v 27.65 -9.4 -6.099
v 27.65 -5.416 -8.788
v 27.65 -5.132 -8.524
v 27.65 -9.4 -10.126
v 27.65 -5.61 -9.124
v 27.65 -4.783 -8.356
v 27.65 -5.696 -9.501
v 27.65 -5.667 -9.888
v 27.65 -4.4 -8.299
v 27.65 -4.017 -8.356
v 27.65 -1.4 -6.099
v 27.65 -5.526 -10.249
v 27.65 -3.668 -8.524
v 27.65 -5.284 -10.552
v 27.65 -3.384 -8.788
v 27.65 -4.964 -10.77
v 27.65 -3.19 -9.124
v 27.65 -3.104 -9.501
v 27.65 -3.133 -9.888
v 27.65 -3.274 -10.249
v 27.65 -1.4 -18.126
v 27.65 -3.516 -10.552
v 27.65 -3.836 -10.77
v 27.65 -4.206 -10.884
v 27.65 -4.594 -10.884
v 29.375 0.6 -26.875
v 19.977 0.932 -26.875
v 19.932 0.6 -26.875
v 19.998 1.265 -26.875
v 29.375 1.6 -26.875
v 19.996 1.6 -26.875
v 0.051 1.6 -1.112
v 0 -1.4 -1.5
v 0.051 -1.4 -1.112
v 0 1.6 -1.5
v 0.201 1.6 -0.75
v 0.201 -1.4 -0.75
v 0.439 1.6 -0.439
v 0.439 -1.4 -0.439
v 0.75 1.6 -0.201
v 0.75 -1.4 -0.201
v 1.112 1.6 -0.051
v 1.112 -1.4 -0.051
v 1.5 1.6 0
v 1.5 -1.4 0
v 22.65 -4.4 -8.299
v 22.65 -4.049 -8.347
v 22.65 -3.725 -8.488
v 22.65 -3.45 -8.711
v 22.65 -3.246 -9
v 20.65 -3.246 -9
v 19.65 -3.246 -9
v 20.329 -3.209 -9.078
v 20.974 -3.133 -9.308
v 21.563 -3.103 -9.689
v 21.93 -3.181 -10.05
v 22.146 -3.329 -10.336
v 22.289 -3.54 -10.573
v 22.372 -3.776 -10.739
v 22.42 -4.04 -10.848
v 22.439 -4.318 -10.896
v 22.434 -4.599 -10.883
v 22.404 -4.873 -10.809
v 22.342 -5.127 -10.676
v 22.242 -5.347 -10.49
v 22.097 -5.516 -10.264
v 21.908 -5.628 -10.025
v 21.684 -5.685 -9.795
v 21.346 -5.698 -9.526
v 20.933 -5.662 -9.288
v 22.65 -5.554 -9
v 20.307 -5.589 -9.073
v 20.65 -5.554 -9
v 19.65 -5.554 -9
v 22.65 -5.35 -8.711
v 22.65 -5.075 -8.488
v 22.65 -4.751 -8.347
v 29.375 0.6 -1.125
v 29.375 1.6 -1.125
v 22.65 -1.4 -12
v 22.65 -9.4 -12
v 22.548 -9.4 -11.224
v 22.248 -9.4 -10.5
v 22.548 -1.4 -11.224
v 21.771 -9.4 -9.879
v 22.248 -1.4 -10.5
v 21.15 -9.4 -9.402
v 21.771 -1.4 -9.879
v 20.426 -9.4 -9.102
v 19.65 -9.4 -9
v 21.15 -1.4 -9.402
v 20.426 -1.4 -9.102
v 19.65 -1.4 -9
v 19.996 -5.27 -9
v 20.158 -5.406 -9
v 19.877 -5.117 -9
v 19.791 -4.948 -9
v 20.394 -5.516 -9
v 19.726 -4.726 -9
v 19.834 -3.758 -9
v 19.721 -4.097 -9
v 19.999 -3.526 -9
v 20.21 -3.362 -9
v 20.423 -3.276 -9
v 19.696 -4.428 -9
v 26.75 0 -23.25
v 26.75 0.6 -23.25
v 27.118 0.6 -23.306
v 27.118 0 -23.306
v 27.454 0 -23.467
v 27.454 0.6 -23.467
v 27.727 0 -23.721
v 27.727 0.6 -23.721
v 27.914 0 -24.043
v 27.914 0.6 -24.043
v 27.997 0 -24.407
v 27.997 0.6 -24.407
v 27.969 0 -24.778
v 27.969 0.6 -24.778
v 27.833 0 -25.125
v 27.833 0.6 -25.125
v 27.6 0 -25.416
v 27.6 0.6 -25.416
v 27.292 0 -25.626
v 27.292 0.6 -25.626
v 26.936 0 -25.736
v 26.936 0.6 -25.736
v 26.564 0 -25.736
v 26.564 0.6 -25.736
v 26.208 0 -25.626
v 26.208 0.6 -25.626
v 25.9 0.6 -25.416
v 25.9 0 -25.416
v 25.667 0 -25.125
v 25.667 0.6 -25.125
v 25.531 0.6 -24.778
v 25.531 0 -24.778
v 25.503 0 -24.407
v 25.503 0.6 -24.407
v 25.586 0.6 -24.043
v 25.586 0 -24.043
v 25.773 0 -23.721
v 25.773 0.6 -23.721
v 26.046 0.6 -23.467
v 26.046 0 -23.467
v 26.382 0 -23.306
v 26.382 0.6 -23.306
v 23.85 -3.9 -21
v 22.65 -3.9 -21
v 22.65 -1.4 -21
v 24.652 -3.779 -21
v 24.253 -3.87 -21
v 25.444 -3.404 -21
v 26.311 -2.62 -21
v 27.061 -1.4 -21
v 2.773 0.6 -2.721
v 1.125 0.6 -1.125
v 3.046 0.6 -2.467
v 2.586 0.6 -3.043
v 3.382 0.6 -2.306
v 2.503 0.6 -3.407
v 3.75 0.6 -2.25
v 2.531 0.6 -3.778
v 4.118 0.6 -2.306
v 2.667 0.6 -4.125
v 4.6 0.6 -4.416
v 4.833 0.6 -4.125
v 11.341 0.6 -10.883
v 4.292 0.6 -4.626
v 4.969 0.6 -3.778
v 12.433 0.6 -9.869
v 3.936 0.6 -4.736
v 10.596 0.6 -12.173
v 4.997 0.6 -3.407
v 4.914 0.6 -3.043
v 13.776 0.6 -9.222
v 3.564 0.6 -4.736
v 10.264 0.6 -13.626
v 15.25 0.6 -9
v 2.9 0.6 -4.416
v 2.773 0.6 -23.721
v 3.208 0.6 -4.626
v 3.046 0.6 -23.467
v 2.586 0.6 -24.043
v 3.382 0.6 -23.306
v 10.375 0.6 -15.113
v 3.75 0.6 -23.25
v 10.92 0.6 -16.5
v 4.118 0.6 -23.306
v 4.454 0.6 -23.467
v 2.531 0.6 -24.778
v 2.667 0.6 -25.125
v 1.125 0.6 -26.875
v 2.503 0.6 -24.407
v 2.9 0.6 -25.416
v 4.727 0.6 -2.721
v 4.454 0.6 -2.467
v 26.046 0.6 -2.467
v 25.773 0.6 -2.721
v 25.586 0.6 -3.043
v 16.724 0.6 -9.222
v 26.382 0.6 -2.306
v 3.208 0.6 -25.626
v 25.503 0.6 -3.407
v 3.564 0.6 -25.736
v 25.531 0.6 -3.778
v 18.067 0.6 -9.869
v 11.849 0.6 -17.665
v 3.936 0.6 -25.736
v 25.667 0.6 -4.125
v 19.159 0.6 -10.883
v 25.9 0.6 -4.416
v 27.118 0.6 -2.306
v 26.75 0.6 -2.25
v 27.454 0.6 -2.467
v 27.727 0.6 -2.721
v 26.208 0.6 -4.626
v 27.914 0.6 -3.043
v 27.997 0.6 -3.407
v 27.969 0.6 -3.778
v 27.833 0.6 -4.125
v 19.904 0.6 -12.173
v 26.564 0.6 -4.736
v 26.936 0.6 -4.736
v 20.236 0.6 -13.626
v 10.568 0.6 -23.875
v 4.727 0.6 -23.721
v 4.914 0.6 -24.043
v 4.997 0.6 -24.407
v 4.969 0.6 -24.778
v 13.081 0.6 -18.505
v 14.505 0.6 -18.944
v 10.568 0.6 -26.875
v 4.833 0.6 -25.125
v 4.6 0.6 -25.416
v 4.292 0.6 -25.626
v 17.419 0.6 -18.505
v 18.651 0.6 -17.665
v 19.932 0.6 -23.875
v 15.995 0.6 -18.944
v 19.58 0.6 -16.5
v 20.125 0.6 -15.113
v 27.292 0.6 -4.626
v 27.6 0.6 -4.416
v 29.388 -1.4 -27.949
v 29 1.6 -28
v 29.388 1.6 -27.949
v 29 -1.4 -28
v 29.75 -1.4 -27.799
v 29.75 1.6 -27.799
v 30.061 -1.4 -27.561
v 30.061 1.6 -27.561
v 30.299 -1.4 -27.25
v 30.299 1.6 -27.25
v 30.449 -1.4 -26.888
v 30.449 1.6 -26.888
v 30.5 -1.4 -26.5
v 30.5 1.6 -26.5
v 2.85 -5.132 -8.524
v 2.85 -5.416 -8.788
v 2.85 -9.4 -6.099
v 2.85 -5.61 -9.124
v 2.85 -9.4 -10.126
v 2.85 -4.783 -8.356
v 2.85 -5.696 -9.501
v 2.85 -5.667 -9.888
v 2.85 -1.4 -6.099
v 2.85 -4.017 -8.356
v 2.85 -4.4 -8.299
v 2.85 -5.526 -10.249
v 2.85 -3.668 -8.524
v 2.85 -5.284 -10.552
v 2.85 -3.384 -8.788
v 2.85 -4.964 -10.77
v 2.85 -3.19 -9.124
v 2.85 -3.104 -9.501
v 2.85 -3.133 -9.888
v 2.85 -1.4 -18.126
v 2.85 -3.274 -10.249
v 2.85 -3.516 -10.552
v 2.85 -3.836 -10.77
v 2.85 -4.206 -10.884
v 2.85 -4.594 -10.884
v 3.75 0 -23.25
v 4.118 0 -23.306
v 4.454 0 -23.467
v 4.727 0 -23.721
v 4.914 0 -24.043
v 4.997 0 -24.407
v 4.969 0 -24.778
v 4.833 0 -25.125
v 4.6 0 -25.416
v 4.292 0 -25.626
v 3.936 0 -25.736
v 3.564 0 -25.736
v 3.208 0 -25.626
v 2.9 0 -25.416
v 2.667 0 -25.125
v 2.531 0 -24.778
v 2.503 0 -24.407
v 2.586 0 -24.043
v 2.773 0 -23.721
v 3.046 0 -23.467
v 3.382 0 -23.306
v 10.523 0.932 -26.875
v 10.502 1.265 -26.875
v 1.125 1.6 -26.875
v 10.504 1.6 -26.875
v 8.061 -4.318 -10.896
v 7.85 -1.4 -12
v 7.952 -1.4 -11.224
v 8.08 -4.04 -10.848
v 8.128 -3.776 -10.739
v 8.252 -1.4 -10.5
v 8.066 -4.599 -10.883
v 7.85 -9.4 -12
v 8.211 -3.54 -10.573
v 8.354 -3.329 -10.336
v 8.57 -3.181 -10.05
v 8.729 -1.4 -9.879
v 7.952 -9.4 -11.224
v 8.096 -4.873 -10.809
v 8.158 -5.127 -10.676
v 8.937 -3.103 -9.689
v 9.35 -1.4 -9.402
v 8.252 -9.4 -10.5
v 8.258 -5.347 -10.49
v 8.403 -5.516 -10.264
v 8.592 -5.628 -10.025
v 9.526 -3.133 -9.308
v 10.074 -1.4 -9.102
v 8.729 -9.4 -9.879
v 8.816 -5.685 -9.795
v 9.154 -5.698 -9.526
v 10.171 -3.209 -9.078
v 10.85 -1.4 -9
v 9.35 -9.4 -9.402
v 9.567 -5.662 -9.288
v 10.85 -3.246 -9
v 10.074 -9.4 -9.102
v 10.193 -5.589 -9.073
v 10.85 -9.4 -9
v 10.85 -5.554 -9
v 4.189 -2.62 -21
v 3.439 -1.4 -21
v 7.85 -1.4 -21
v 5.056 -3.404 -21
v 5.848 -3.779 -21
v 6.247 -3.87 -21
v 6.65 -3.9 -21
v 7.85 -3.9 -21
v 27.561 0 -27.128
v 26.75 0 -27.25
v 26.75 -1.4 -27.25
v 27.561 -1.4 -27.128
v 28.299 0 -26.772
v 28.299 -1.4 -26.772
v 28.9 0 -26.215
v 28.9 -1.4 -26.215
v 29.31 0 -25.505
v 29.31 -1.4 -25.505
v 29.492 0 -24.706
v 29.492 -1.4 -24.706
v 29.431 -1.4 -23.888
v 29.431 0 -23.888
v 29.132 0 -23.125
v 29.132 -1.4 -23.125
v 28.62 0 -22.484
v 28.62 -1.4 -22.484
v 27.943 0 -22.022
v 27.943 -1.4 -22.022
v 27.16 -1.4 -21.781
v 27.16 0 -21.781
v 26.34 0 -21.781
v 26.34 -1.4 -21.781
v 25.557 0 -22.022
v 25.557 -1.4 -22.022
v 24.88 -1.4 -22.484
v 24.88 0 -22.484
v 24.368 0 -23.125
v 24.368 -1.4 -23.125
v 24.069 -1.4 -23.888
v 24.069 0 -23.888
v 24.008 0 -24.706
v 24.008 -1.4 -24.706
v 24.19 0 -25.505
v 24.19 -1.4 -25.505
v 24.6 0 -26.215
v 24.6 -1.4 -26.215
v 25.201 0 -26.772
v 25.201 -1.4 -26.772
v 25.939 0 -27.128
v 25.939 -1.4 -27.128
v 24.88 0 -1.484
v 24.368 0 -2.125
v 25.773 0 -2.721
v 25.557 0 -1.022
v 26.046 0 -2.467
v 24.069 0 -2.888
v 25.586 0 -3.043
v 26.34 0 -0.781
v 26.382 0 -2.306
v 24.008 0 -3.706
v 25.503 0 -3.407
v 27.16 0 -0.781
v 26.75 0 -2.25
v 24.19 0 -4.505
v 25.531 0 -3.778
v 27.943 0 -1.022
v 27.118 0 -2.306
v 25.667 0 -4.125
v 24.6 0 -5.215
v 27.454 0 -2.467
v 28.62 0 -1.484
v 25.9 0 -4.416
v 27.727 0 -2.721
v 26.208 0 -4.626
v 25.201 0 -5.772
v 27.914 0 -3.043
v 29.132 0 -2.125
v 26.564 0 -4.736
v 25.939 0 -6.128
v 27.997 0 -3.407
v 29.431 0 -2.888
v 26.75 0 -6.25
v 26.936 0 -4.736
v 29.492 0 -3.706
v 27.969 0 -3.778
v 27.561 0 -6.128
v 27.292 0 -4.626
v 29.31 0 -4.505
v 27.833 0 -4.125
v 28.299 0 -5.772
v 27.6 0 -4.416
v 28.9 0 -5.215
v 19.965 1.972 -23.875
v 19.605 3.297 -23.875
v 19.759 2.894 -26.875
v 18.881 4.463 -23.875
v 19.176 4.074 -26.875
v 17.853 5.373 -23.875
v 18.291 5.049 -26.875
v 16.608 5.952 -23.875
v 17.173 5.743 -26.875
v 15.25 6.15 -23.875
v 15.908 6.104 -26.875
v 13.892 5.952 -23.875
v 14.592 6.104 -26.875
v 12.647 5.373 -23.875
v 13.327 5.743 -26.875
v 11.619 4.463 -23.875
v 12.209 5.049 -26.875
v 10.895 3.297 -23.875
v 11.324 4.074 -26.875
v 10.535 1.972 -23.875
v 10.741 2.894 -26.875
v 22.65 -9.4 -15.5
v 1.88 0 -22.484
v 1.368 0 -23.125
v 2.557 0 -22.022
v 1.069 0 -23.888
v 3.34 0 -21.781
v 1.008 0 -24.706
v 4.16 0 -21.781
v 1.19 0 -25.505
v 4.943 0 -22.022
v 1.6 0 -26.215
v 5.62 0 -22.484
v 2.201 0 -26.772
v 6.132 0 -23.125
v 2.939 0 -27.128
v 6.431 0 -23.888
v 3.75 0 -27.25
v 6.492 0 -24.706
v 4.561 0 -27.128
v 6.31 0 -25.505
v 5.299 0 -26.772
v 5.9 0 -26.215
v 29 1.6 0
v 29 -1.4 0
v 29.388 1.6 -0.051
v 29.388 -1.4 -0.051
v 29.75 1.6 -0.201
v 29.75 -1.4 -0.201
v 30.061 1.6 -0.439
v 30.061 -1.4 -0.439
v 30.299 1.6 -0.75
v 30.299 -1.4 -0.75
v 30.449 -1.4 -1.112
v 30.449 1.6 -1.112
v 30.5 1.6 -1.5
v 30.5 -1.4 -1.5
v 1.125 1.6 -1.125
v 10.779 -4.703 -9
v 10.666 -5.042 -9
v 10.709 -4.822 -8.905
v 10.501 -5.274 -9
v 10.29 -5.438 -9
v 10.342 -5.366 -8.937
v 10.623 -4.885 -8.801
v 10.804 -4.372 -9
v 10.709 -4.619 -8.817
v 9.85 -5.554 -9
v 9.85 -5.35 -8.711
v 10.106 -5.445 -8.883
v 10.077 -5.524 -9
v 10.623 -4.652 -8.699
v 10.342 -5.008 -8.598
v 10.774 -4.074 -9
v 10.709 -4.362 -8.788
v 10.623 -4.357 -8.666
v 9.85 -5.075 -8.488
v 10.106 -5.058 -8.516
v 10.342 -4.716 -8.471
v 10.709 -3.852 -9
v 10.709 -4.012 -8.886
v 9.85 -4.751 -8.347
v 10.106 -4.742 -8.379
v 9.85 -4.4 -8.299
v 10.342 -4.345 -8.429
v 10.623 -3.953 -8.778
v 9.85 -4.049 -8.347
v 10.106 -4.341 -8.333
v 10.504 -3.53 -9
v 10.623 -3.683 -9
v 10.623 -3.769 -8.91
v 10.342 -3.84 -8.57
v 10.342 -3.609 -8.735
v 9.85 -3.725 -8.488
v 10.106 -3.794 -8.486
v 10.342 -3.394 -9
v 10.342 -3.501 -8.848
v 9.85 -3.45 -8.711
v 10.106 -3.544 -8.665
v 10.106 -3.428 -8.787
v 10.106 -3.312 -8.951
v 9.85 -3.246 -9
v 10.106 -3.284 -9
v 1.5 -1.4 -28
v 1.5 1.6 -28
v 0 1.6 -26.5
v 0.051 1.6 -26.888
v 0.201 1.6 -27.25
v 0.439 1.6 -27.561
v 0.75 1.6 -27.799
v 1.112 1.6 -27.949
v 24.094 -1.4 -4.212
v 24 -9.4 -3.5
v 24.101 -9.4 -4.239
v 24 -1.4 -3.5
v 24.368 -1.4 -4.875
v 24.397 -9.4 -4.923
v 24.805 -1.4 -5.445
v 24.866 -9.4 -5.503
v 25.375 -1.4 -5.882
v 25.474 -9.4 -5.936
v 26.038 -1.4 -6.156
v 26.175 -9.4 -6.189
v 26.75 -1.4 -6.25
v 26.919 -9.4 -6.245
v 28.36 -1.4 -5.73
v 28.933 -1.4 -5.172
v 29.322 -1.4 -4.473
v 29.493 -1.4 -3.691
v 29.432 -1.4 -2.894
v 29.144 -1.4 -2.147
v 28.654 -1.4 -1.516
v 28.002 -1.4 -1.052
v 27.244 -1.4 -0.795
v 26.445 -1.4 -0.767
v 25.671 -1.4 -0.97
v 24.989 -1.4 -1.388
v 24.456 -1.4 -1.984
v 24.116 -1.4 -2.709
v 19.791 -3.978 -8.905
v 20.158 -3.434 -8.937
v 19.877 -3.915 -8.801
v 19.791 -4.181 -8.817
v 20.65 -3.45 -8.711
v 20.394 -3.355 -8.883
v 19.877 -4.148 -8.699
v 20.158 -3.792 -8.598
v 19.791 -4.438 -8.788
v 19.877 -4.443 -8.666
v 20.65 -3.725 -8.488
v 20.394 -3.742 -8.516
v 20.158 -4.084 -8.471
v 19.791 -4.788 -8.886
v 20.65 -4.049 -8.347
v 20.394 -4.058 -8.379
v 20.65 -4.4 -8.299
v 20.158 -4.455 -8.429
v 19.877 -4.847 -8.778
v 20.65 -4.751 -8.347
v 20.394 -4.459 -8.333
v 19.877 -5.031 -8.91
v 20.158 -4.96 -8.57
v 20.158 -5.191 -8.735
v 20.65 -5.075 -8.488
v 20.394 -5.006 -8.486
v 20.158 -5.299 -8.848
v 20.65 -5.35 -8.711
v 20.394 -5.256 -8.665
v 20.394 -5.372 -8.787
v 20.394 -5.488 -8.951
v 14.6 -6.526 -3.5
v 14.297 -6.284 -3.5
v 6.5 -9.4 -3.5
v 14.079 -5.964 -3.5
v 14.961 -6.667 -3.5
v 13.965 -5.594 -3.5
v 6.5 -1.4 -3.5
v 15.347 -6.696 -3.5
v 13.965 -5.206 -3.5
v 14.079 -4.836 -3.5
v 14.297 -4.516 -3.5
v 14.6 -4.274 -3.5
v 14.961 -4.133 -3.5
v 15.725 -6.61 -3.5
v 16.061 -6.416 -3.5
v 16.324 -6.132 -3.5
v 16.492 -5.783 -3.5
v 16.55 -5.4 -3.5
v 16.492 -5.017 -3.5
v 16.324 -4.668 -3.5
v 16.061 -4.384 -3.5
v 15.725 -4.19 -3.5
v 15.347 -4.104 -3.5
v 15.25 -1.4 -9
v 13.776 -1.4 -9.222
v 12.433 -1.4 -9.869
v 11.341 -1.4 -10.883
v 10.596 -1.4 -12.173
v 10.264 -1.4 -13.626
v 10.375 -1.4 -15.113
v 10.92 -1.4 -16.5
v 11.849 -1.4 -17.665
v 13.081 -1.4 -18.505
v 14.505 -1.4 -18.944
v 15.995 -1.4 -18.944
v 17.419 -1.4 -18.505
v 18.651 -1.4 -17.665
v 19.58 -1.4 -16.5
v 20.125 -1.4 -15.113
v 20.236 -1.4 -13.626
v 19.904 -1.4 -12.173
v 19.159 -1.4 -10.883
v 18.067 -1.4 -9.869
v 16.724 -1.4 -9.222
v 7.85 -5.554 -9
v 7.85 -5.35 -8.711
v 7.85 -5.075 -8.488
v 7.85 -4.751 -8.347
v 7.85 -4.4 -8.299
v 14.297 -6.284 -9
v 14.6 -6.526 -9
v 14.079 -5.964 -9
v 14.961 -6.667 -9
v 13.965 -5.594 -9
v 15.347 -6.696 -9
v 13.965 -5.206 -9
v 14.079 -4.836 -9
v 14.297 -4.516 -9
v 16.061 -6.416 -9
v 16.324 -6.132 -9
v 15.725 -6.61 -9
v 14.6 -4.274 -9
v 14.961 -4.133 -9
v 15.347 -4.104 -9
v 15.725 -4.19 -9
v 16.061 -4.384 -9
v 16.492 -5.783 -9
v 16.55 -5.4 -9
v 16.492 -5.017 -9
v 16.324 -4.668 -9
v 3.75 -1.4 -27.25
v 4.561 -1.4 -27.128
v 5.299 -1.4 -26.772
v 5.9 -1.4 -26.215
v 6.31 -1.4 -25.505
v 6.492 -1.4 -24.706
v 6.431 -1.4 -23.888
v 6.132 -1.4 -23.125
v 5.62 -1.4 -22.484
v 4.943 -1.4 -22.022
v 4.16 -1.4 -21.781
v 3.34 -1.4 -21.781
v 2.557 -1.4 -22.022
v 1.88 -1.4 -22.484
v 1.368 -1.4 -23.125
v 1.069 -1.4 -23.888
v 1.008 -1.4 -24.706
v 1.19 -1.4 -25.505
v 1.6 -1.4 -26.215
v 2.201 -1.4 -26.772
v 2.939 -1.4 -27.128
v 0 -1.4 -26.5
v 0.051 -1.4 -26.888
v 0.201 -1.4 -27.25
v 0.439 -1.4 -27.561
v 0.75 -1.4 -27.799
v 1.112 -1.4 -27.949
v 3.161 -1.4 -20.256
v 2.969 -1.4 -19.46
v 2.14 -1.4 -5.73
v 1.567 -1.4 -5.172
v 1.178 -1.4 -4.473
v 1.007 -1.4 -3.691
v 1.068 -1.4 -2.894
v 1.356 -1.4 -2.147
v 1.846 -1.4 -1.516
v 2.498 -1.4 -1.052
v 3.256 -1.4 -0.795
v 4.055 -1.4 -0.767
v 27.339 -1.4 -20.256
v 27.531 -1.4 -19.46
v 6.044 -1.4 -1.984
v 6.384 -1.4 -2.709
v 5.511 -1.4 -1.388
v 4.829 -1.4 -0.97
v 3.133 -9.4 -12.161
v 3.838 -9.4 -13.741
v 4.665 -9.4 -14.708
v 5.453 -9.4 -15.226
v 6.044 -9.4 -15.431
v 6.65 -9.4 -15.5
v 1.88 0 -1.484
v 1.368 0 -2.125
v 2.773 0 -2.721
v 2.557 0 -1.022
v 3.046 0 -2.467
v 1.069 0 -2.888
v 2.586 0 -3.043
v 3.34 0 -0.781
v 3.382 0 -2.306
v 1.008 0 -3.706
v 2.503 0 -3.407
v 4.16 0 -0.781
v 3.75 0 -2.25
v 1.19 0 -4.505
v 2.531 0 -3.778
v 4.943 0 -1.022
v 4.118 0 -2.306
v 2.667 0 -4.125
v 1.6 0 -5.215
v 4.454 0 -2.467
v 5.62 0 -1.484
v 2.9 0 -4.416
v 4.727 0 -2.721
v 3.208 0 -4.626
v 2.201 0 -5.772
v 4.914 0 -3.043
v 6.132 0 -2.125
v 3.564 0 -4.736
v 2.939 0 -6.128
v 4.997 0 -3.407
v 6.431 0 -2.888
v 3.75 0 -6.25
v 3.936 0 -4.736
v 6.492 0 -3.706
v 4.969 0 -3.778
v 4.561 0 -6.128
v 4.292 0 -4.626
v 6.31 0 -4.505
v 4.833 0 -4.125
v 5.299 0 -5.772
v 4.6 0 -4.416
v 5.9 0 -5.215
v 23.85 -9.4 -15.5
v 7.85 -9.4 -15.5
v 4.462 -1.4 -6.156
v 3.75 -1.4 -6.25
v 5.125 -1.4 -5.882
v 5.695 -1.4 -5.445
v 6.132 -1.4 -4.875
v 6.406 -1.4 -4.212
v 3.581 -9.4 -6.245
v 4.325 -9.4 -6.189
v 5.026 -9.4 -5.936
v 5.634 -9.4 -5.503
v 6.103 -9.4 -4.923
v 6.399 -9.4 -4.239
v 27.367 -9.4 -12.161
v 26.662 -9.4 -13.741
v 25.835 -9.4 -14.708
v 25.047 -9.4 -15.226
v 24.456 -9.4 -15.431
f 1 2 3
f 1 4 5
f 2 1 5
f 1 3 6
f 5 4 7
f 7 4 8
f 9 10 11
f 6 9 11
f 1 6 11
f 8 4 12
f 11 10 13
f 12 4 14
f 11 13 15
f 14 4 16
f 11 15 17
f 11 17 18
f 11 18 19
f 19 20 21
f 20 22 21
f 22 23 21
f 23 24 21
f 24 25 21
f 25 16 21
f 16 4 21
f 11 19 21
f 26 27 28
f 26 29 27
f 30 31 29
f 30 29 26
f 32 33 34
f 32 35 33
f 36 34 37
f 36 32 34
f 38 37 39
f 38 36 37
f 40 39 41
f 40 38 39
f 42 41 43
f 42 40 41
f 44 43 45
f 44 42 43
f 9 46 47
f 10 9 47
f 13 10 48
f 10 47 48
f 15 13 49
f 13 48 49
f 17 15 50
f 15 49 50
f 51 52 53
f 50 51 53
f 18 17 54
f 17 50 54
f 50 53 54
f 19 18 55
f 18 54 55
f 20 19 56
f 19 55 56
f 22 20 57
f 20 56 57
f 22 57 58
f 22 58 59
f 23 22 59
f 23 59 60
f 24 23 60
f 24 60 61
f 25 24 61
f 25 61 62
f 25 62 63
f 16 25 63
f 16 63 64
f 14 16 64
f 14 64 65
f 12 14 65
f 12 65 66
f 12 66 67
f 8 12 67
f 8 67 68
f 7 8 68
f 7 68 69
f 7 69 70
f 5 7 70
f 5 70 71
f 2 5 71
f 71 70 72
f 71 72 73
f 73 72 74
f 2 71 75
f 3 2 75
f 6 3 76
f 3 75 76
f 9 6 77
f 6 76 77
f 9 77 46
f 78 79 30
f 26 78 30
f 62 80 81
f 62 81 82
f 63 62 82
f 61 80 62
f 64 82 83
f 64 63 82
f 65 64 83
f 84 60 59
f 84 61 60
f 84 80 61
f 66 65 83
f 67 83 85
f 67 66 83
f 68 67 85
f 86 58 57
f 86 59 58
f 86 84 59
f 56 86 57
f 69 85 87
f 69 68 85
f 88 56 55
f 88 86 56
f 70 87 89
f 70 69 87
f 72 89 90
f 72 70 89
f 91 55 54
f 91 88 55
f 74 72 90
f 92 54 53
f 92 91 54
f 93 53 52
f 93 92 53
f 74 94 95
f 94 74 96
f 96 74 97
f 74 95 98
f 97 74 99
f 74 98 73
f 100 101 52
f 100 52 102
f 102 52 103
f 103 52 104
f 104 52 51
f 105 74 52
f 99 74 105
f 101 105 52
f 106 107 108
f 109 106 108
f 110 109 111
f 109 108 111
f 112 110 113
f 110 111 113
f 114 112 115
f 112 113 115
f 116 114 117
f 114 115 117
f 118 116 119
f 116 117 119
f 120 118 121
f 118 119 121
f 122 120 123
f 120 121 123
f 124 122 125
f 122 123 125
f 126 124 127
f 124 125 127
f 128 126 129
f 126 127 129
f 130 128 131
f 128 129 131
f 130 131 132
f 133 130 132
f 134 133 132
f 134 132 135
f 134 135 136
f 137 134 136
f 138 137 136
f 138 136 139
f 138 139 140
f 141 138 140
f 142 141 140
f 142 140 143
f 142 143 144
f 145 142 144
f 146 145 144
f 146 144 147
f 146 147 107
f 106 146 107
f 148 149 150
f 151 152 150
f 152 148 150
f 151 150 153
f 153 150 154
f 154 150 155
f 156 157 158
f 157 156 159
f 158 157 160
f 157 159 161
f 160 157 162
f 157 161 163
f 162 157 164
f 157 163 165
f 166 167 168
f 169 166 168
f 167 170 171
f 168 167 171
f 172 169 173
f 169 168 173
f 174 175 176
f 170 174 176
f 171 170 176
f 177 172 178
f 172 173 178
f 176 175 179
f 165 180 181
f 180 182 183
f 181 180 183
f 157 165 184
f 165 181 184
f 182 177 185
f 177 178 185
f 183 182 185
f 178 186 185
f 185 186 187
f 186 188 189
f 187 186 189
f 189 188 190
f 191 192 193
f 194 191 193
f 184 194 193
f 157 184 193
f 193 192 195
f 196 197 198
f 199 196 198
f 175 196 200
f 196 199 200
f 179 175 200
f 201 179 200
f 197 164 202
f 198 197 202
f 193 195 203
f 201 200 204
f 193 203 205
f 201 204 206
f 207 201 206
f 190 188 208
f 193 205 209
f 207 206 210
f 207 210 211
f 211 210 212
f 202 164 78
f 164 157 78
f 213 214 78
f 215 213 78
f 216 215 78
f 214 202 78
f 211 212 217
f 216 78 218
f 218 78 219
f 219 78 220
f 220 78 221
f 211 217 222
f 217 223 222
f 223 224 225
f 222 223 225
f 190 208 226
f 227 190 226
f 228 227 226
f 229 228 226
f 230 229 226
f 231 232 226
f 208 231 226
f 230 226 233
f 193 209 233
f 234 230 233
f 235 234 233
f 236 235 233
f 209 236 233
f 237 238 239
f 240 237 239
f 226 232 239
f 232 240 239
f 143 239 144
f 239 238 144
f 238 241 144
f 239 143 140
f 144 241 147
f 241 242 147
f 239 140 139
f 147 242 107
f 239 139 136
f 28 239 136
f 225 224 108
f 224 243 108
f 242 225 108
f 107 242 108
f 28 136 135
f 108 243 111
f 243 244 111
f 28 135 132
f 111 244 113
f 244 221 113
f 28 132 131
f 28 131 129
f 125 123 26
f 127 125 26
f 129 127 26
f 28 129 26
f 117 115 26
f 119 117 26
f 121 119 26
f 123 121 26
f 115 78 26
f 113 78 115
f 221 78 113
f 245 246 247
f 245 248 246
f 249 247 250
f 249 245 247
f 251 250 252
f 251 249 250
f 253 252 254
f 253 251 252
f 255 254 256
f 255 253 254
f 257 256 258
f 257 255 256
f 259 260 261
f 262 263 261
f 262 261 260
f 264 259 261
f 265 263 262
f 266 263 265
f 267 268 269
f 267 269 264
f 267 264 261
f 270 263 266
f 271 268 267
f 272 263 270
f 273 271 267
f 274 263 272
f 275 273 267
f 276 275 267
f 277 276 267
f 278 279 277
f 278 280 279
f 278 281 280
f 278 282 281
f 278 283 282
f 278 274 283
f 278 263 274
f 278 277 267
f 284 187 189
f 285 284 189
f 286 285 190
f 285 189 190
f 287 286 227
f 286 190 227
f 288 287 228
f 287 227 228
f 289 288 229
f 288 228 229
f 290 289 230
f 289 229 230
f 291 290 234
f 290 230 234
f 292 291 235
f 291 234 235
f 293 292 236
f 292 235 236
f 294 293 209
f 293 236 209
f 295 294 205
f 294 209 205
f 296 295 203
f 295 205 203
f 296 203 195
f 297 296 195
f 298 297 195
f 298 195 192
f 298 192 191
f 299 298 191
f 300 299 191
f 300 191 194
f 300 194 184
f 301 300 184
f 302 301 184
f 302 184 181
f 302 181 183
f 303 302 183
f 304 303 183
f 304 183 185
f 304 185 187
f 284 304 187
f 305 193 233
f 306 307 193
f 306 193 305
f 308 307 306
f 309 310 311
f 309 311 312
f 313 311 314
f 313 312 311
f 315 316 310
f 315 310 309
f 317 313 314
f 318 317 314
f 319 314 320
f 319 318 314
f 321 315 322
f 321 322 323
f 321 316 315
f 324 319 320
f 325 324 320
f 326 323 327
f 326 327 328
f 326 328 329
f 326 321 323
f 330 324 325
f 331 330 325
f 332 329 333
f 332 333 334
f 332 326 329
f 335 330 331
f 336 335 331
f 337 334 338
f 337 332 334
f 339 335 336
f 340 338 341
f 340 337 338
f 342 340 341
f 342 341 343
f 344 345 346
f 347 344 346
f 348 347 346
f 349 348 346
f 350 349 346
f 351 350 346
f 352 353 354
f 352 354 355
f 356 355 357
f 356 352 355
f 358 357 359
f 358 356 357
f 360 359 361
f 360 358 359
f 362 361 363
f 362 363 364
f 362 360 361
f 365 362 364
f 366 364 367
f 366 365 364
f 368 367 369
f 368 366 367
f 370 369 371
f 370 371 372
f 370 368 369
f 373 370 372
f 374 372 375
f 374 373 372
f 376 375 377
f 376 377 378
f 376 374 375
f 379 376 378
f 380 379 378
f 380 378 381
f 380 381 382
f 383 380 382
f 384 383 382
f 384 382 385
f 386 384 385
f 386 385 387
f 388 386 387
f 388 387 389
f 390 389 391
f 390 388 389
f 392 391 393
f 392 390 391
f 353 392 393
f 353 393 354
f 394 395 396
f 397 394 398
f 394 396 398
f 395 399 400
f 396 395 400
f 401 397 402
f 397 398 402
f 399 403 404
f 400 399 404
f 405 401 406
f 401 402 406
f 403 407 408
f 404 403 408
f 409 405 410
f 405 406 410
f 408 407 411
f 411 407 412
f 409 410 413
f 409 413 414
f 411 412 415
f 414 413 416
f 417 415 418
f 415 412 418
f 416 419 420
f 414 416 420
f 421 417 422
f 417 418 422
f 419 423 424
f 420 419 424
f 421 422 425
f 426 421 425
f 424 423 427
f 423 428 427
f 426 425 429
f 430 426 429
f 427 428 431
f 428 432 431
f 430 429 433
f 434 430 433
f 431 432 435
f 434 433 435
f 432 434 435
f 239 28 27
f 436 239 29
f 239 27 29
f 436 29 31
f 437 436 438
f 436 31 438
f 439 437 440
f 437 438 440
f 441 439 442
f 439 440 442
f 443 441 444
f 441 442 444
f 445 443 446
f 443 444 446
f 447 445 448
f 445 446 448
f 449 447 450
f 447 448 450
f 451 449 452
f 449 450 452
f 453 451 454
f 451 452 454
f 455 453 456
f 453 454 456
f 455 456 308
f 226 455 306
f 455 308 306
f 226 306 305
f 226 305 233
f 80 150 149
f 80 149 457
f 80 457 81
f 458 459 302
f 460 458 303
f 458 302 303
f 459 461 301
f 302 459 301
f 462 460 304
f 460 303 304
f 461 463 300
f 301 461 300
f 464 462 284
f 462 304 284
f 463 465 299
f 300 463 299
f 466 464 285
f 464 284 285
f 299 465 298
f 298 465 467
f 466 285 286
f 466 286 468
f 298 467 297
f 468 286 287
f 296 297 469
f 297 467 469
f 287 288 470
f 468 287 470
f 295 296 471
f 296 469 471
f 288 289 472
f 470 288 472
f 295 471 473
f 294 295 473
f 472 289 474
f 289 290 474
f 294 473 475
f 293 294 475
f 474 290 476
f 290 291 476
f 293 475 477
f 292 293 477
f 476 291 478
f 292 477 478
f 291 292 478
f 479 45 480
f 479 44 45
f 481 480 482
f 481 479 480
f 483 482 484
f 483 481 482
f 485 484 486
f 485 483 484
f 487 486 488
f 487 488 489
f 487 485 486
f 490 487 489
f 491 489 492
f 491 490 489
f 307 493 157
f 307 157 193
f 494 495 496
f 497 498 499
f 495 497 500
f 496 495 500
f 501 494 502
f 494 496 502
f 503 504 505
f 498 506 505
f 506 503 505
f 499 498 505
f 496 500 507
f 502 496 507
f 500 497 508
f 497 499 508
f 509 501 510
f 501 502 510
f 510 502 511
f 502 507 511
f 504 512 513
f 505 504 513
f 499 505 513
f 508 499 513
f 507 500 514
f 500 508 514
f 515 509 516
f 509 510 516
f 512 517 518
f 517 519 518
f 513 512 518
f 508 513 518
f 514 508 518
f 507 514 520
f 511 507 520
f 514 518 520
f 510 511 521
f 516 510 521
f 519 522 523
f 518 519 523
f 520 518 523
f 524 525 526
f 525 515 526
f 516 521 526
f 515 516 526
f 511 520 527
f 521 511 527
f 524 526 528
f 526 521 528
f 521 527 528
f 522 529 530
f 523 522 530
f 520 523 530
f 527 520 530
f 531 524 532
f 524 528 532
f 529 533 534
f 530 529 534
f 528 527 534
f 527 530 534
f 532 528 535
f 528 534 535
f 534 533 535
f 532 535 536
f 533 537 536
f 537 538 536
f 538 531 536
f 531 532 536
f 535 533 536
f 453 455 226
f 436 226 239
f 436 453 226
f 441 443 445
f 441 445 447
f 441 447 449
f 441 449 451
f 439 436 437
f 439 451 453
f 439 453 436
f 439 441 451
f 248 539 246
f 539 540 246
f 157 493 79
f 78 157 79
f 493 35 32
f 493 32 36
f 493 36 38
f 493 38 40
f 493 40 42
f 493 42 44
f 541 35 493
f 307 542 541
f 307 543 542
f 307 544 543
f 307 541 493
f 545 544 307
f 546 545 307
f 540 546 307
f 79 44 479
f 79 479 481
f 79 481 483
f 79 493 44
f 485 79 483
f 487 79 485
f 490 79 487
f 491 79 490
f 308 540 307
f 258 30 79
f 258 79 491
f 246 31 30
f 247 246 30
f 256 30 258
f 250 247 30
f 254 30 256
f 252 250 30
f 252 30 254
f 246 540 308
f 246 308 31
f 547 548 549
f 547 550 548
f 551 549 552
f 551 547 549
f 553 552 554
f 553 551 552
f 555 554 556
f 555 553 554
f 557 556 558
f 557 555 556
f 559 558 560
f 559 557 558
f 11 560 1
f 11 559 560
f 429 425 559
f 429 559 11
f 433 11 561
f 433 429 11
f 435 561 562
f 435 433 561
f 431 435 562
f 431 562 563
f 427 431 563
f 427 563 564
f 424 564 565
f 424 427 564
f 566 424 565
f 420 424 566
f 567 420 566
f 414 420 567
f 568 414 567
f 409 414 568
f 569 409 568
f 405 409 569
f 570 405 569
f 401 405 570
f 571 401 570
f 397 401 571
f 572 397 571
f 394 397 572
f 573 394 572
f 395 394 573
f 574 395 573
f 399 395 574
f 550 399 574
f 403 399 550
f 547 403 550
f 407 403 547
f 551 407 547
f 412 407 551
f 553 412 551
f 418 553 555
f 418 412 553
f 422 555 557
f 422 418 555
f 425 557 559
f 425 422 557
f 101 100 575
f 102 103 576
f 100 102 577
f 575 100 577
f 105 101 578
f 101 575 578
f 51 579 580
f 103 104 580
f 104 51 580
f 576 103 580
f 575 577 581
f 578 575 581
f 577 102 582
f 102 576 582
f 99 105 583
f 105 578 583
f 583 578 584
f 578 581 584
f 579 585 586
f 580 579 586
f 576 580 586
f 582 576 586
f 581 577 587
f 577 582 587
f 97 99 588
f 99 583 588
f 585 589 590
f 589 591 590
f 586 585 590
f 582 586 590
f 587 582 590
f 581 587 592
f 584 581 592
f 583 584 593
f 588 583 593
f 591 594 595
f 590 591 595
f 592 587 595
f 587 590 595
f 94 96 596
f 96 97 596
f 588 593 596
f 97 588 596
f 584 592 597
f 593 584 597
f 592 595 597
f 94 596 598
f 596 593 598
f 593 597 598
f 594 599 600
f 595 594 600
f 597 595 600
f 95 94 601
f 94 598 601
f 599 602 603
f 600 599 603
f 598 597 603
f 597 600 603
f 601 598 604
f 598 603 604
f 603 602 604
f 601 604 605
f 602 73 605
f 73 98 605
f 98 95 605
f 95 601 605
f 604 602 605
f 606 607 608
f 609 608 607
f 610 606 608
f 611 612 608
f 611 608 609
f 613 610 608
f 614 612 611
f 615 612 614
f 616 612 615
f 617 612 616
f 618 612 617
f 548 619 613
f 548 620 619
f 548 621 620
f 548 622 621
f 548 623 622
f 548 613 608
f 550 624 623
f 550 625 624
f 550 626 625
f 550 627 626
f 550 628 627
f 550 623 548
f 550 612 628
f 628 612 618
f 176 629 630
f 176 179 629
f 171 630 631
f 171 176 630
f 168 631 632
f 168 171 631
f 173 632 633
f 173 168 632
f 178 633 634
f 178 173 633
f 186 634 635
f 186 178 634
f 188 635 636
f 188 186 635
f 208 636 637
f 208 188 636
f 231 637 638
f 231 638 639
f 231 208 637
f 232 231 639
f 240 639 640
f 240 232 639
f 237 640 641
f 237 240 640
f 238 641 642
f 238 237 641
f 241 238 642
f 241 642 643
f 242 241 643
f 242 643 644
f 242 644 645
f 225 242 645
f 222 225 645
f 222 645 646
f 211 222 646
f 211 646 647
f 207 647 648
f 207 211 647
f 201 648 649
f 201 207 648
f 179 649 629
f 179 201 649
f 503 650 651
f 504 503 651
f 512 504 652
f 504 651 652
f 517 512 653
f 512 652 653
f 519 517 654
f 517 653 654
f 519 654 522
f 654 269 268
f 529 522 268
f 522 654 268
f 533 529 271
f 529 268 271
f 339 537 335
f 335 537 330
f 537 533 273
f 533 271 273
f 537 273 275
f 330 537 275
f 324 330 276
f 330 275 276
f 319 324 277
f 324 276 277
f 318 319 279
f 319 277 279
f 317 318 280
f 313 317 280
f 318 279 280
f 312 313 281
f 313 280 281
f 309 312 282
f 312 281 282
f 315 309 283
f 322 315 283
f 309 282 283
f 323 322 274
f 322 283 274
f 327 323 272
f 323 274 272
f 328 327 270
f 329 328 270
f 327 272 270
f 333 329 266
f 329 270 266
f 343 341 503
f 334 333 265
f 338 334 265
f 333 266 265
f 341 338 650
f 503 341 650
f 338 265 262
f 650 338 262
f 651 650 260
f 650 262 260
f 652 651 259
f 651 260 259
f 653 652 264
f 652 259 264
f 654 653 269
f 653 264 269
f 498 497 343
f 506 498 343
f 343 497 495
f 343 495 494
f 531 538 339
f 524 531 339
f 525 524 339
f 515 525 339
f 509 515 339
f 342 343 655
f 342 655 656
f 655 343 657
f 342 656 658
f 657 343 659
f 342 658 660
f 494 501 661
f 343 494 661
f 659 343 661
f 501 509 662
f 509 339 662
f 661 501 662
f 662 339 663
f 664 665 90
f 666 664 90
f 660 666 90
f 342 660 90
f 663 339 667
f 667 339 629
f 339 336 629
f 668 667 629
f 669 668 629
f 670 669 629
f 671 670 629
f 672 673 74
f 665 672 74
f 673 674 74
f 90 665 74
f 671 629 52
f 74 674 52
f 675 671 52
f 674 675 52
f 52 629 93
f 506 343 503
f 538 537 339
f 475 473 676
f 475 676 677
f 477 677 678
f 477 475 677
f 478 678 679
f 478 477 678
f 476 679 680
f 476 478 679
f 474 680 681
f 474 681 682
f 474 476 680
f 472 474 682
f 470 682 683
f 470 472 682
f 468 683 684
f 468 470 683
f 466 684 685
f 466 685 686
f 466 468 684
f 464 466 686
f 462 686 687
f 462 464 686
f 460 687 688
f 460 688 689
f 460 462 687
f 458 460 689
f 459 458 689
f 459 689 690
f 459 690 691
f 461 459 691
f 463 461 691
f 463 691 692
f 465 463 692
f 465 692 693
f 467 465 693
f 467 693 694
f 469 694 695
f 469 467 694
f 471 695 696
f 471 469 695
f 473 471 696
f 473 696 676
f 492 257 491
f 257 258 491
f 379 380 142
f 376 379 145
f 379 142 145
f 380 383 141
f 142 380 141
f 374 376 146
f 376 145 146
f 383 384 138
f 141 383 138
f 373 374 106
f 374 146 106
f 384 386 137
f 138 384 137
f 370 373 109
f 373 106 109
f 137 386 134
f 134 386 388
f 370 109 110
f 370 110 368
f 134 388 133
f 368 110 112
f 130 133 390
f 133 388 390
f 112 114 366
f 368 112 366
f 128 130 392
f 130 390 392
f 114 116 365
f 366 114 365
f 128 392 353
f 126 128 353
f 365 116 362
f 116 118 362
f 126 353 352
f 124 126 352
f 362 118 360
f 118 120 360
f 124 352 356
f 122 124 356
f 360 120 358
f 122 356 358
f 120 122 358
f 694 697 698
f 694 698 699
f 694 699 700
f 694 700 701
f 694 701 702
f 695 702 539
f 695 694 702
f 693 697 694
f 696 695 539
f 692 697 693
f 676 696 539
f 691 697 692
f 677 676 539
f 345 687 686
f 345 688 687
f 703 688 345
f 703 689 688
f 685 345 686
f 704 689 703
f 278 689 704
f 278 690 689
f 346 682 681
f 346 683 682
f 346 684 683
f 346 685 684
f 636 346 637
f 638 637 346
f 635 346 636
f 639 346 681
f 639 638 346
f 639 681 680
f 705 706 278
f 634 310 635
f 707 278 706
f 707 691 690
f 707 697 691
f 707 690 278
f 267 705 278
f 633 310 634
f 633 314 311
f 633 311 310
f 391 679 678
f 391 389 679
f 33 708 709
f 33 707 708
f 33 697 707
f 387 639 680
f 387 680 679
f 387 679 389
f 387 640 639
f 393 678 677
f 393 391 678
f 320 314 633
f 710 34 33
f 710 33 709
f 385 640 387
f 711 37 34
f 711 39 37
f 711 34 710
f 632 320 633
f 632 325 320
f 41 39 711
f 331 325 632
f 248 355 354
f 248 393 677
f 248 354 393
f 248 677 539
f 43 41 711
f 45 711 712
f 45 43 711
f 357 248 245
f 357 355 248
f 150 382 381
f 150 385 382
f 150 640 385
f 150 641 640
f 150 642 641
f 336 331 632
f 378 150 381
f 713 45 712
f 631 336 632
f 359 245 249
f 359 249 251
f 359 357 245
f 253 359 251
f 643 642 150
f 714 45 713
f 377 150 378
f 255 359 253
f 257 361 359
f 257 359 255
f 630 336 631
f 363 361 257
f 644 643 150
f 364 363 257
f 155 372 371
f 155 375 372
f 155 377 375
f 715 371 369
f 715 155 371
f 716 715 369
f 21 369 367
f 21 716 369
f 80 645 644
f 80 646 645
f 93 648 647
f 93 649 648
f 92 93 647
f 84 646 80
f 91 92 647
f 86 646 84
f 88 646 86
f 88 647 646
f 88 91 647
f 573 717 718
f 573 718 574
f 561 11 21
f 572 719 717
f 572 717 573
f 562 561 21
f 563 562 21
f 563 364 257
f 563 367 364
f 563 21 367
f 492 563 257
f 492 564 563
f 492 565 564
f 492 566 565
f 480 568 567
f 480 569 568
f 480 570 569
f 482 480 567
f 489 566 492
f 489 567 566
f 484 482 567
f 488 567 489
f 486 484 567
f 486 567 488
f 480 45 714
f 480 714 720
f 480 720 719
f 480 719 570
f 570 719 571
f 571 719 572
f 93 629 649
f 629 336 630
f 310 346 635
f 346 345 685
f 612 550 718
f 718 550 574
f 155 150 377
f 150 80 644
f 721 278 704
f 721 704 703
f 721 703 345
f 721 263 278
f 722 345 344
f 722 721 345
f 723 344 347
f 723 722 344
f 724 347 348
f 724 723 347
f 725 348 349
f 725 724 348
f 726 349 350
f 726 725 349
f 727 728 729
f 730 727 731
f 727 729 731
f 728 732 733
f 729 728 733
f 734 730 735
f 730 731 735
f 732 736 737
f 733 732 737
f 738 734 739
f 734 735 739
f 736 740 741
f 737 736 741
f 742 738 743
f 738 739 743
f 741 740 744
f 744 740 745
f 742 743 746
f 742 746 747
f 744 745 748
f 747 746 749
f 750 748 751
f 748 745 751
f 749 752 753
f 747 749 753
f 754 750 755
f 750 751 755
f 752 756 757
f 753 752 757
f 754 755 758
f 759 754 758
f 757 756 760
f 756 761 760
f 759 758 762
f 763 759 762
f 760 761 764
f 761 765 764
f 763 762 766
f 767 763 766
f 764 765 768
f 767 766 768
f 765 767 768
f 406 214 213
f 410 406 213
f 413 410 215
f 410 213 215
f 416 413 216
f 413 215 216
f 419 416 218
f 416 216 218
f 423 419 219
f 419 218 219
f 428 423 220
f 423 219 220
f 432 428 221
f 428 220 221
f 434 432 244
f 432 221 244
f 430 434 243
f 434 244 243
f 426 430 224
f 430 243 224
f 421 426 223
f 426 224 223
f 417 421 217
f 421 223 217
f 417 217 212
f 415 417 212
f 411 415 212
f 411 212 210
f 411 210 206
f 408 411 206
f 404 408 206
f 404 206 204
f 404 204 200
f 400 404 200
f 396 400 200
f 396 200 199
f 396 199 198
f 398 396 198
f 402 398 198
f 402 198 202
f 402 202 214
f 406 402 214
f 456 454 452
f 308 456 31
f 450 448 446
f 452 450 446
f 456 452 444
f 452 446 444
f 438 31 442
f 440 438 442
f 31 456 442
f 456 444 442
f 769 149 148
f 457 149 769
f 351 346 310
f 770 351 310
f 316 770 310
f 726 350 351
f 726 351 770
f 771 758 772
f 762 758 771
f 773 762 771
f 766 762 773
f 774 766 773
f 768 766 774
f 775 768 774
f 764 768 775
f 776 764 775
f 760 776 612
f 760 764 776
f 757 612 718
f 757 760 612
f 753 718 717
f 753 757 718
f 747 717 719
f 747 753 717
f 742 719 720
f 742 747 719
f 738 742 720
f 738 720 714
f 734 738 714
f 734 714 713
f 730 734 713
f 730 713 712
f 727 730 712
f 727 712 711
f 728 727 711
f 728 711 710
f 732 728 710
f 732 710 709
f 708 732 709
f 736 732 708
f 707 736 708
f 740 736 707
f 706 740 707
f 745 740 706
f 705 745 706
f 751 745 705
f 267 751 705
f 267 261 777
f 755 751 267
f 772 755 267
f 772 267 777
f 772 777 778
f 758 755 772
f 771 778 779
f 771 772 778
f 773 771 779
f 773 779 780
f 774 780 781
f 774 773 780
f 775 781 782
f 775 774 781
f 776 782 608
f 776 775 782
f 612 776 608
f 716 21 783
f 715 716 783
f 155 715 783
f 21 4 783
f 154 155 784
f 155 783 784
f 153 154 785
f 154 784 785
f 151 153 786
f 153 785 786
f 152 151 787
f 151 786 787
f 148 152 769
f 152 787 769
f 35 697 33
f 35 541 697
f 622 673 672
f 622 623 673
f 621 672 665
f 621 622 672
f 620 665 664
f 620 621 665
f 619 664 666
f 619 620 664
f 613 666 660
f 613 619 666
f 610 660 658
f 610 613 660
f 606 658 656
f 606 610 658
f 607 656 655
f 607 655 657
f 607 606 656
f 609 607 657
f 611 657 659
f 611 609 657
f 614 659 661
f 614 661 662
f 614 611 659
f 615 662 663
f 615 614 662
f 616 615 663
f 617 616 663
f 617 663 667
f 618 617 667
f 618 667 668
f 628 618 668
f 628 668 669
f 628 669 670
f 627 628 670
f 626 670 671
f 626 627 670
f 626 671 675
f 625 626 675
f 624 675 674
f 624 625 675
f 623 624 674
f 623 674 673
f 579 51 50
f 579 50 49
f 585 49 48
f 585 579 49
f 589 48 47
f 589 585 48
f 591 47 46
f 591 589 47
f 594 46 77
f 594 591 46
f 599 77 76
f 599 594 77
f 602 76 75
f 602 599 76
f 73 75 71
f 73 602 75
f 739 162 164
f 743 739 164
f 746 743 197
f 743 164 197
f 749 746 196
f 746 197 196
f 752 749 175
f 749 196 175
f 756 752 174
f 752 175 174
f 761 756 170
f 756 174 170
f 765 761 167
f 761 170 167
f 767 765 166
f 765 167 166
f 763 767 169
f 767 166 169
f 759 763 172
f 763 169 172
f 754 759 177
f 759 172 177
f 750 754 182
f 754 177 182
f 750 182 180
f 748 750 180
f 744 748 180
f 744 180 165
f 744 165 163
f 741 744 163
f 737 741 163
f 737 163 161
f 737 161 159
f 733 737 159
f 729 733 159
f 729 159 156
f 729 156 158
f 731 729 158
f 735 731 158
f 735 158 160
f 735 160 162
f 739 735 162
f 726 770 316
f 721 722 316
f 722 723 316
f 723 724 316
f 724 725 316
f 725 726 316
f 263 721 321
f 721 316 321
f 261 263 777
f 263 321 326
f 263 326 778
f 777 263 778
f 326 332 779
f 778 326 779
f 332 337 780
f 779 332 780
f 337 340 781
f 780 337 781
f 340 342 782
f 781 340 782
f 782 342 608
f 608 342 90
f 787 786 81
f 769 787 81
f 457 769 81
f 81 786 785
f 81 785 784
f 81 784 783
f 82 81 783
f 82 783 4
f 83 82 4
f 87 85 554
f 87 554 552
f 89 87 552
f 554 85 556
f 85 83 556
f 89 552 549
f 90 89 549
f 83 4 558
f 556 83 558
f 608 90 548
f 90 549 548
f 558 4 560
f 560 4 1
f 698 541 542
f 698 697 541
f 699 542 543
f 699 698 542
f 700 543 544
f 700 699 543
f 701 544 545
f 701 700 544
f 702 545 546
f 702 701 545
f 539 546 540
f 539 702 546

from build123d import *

# Parameters (mm, degrees)
SKETCH_1_W           = 30.5
SKETCH_1_H           = 28
EXTRUDE_1_DEPTH      = 1.6
SKETCH_2_W           = 28.25
SKETCH_2_H           = 25.75
CUT_EXTRUDE_1_DEPTH  = 1
EXTRUDE_2_DEPTH      = 3
CUT_EXTRUDE_2_REACH  = 43.774
SKETCH_5_R           = 1.25
CUT_EXTRUDE_3_REACH  = 43.774
SKETCH_6_R           = 5
SKETCH_7_W           = 30.5
SKETCH_7_H           = 28
SKETCH_7_R           = 2.75
SKETCH_7_R_2         = 5
EXTRUDE_3_DEPTH      = 1.4
SKETCH_8_W           = 5
SKETCH_8_H           = 14
EXTRUDE_4_DEPTH      = 10
CUT_EXTRUDE_4_DEPTH  = 41.969287277
SKETCH_10_W          = 24.8
SKETCH_10_H          = 10
EXTRUDE_5_DEPTH      = 3.5
SKETCH_11_R          = 2.75
CUT_EXTRUDE_5_DEPTH  = 43.944266206
SKETCH_12_R          = 1.3
CUT_EXTRUDE_6_DEPTH  = 41.969287277
CUT_EXTRUDE_7_REACH  = 42.749
SKETCH_13_R          = 1.3
CUT_EXTRUDE_8_REACH  = 42.969
SKETCH_14_W          = 12
SKETCH_14_H          = 2
SKETCH_15_W          = 14.8
SKETCH_15_H          = 8
SKETCH_15_R          = 1.3
EXTRUDE_6_DEPTH      = 2
FILLET_1_R           = 3.8
FILLET_2_R           = 1.5
FILLET_3_R           = 3
CUT_EXTRUDE_START    = -3
CUT_EXTRUDE_9_DEPTH  = 3
CUT_EXTRUDE_10_DEPTH = 3
FILLET_4_R           = 1


with BuildPart() as part:
    # 草图1 → 凸台-拉伸1 (new body)
    with BuildSketch(Plane(origin=(0, 0, 0), x_dir=(1, 0, 0), z_dir=(0, 1, 0))):
        with Locations((15.25, 14)):
            Rectangle(SKETCH_1_W, SKETCH_1_H)
    extrude(amount=EXTRUDE_1_DEPTH)

    # 草图2 → 切除-拉伸1 (cut)
    with BuildSketch(Plane(origin=(0, 1.6, 0), x_dir=(1, 0, 0), z_dir=(0, 1, 0))):
        with Locations((15.25, 14)):
            Rectangle(SKETCH_2_W, SKETCH_2_H)
    extrude(amount=-CUT_EXTRUDE_1_DEPTH, mode=Mode.SUBTRACT)

    # 草图3 → 凸台-拉伸2 (add)
    with BuildSketch(Plane(origin=(57.75, 0, -26.875), x_dir=(1, 0, 0), z_dir=(0, 0, 1))):
        with BuildLine():
            Line((-47.182146943, 0.6), (-37.817853057, 0.6))
            ThreePointArc((-37.817853057, 0.6), (-42.5, 6.15), (-47.182146943, 0.6))
        make_face()
    extrude(amount=EXTRUDE_2_DEPTH)

    # 草图5 → 切除-拉伸2 (cut, up to next)
    with BuildSketch(Plane(origin=(0, 0.6, 0), x_dir=(1, 0, 0), z_dir=(0, 1, 0)), mode=Mode.PRIVATE) as cut_extrude_2_sk1:
        with Locations(Location((3.75, 24.5, 0), (0, 0, 270))):
            Circle(SKETCH_5_R)
    cut_extrude_2_tool1 = extrude(cut_extrude_2_sk1.sketch, amount=-CUT_EXTRUDE_2_REACH, mode=Mode.PRIVATE) & part.part
    # 草图5 → 切除-拉伸2 (cut, up to next)
    with BuildSketch(Plane(origin=(0, 0.6, 0), x_dir=(1, 0, 0), z_dir=(0, 1, 0)), mode=Mode.PRIVATE) as cut_extrude_2_sk2:
        with Locations(Location((26.75, 24.5, 0), (0, 0, 270))):
            Circle(SKETCH_5_R)
    cut_extrude_2_tool2 = extrude(cut_extrude_2_sk2.sketch, amount=-CUT_EXTRUDE_2_REACH, mode=Mode.PRIVATE) & part.part
    # 草图5 → 切除-拉伸2 (cut, up to next)
    with BuildSketch(Plane(origin=(0, 0.6, 0), x_dir=(1, 0, 0), z_dir=(0, 1, 0)), mode=Mode.PRIVATE) as cut_extrude_2_sk3:
        with Locations(Location((3.75, 3.5, 0), (0, 0, 270))):
            Circle(SKETCH_5_R)
    cut_extrude_2_tool3 = extrude(cut_extrude_2_sk3.sketch, amount=-CUT_EXTRUDE_2_REACH, mode=Mode.PRIVATE) & part.part
    # 草图5 → 切除-拉伸2 (cut, up to next)
    with BuildSketch(Plane(origin=(0, 0.6, 0), x_dir=(1, 0, 0), z_dir=(0, 1, 0)), mode=Mode.PRIVATE) as cut_extrude_2_sk4:
        with Locations(Location((26.75, 3.5, 0), (0, 0, 270))):
            Circle(SKETCH_5_R)
    cut_extrude_2_tool4 = extrude(cut_extrude_2_sk4.sketch, amount=-CUT_EXTRUDE_2_REACH, mode=Mode.PRIVATE) & part.part
    add(cut_extrude_2_tool1.solids().sort_by_distance((3.75, 0.6, -24.5))[0], mode=Mode.SUBTRACT)
    add(cut_extrude_2_tool2.solids().sort_by_distance((26.75, 0.6, -24.5))[0], mode=Mode.SUBTRACT)
    add(cut_extrude_2_tool3.solids().sort_by_distance((3.75, 0.6, -3.5))[0], mode=Mode.SUBTRACT)
    add(cut_extrude_2_tool4.solids().sort_by_distance((26.75, 0.6, -3.5))[0], mode=Mode.SUBTRACT)

    # 草图6 → 切除-拉伸3 (cut, up to next)
    with BuildSketch(Plane(origin=(0, 0.6, 0), x_dir=(1, 0, 0), z_dir=(0, 1, 0)), mode=Mode.PRIVATE) as cut_extrude_3_sk1:
        with Locations(Location((15.25, 14, 0), (0, 0, 270))):
            Circle(SKETCH_6_R)
    cut_extrude_3_tool1 = extrude(cut_extrude_3_sk1.sketch, amount=-CUT_EXTRUDE_3_REACH, mode=Mode.PRIVATE) & part.part
    add(cut_extrude_3_tool1.solids().sort_by_distance((15.25, 0.6, -14))[0], mode=Mode.SUBTRACT)

    # 草图7 → 凸台-拉伸3 (add)
    with BuildSketch(Plane.XZ):
        with Locations((15.25, -14)):
            Rectangle(SKETCH_7_W, SKETCH_7_H)
        with Locations(Location((3.75, -3.5, 0), (0, 0, 270))):
            Circle(SKETCH_7_R, mode=Mode.SUBTRACT)
        with Locations(Location((26.75, -3.5, 0), (0, 0, 270))):
            Circle(SKETCH_7_R, mode=Mode.SUBTRACT)
        with Locations(Location((3.75, -24.5, 0), (0, 0, 270))):
            Circle(SKETCH_7_R, mode=Mode.SUBTRACT)
        with Locations(Location((26.75, -24.5, 0), (0, 0, 270))):
            Circle(SKETCH_7_R, mode=Mode.SUBTRACT)
        with Locations(Location((15.25, -14, 0), (0, 0, 90))):
            Circle(SKETCH_7_R_2, mode=Mode.SUBTRACT)
    extrude(amount=EXTRUDE_3_DEPTH)

    # 草图8 → 凸台-拉伸4 (add)
    with BuildSketch(Plane.XZ.offset(1.4)):
        with Locations((25.15, -14)):
            Rectangle(SKETCH_8_W, SKETCH_8_H)
        with Locations((5.35, -14)):
            Rectangle(SKETCH_8_W, SKETCH_8_H)
    extrude(amount=EXTRUDE_4_DEPTH)

    # 草图9 → 切除-拉伸4 (cut, through all)
    with BuildSketch(Plane.ZY.offset(-2.85)):
        Polygon((-21, -3.9), (-13.5, -11.4), (-21, -11.4), align=None)
    extrude(amount=-CUT_EXTRUDE_4_DEPTH, mode=Mode.SUBTRACT)

    # 草图10 → 凸台-拉伸5 (add)
    with BuildSketch(Plane.XY.offset(-7)):
        with Locations((15.25, -6.4)):
            Rectangle(SKETCH_10_W, SKETCH_10_H)
    extrude(amount=EXTRUDE_5_DEPTH)

    # 草图11 → 切除-拉伸5 (cut, through all)
    with BuildSketch(Plane.XZ):
        with Locations(Location((26.75, -3.5, 0), (0, 0, 180))):
            Circle(SKETCH_11_R)
        with Locations((3.75, -3.5)):
            Circle(SKETCH_11_R)
    extrude(amount=CUT_EXTRUDE_5_DEPTH, mode=Mode.SUBTRACT)

    # 草图12 → 切除-拉伸6 (cut, through all)
    with BuildSketch(Plane.ZY.offset(-2.85)):
        with Locations((-9.598557292, -4.4)):
            Circle(SKETCH_12_R)
    extrude(amount=-CUT_EXTRUDE_6_DEPTH, mode=Mode.SUBTRACT)

    # 草图13 → 切除-拉伸7 (cut, up to next)
    with BuildSketch(Plane.XY.offset(-3.5), mode=Mode.PRIVATE) as cut_extrude_7_sk1:
        with Locations((15.25, -5.4)):
            Circle(SKETCH_13_R)
    cut_extrude_7_tool1 = extrude(cut_extrude_7_sk1.sketch, amount=-CUT_EXTRUDE_7_REACH, mode=Mode.PRIVATE) & part.part
    add(cut_extrude_7_tool1.solids().sort_by_distance((15.25, -5.4, -3.5))[0], mode=Mode.SUBTRACT)

    # 草图14 → 切除-拉伸8 (cut, up to next)
    with BuildSketch(Plane(origin=(27.65, 0, 0), x_dir=(0, 0, -1), z_dir=(1, 0, 0)), mode=Mode.PRIVATE) as cut_extrude_8_sk1:
        with Locations((9.5, -10.4)):
            Rectangle(SKETCH_14_W, SKETCH_14_H)
    cut_extrude_8_tool1 = extrude(cut_extrude_8_sk1.sketch, amount=-CUT_EXTRUDE_8_REACH, mode=Mode.PRIVATE) & part.part
    add(cut_extrude_8_tool1.solids().sort_by_distance((27.65, -10.4, -9.5))[0], mode=Mode.SUBTRACT)

    # 草图15 → 凸台-拉伸6 (add)
    with BuildSketch(Plane(origin=(0, 0, -7), x_dir=(-1, 0, 0), z_dir=(0, 0, -1))):
        with Locations((-15.25, -5.4)):
            Rectangle(SKETCH_15_W, SKETCH_15_H)
        with Locations(Location((-15.25, -5.4, 0), (0, 0, 180))):
            Circle(SKETCH_15_R, mode=Mode.SUBTRACT)
    extrude(amount=EXTRUDE_6_DEPTH)

    # 圆角1
    fillet_1_edges = [part.edges().sort_by_distance(p)[0] for p in [
        (27.65, -6.65, -18.25),
        (2.85, -6.65, -18.25),
    ]]
    fillet(fillet_1_edges, radius=FILLET_1_R)

    # 圆角2
    fillet_2_edges = [part.edges().sort_by_distance(p)[0] for p in [
        (0, 0.1, -28),
        (30.5, 0.1, -28),
        (30.5, 0.1, 0),
        (0, 0.1, 0),
    ]]
    fillet(fillet_2_edges, radius=FILLET_2_R)

    # 圆角3
    # the kernel refuses this fillet: 3 mm, written as the material it adds along each edge
    with BuildSketch(Plane(origin=(22.65, 6.1, -9), x_dir=(0, 0, -1), z_dir=(0, -1, 0))) as fillet_3_piece_1_section:
        with BuildLine():
            CenterArc((FILLET_3_R, -FILLET_3_R), FILLET_3_R, 90, 90)
            Line((0, -FILLET_3_R), (0, 0))
            Line((0, 0), (FILLET_3_R, 0))
        make_face()
    fillet_3_piece_1 = extrude(amount=16.845994295, mode=Mode.PRIVATE)
    fillet_3_piece_1 = split(fillet_3_piece_1, bisect_by=Plane(origin=(22.65, -9.4, -9), z_dir=(0, 1, 0)), keep=Keep.TOP, mode=Mode.PRIVATE)
    fillet_3_piece_1 = fillet_3_piece_1 - Plane(origin=(22.65, -4.4, -9.598557292), x_dir=(0, 0, 1), z_dir=(-1, 0, 0)) * Cylinder(1.3, 46, mode=Mode.PRIVATE)
    fillet_3_piece_1 = split(fillet_3_piece_1, bisect_by=Plane(origin=(22.65, 0.6, -9), z_dir=(0, -1, 0)), keep=Keep.TOP, mode=Mode.PRIVATE)
    add(fillet_3_piece_1)
    with BuildSketch(Plane(origin=(7.85, -10.745994295, -9), x_dir=(1, 0, 0), z_dir=(0, 1, 0))) as fillet_3_piece_2_section:
        with BuildLine():
            CenterArc((FILLET_3_R, FILLET_3_R), FILLET_3_R, 180, 90)
            Line((0, FILLET_3_R), (0, 0))
            Line((0, 0), (FILLET_3_R, 0))
        make_face()
    fillet_3_piece_2 = extrude(amount=16.845994295, mode=Mode.PRIVATE)
    fillet_3_piece_2 = split(fillet_3_piece_2, bisect_by=Plane(origin=(7.85, -9.4, -9), z_dir=(0, 1, 0)), keep=Keep.TOP, mode=Mode.PRIVATE)
    fillet_3_piece_2 = fillet_3_piece_2 - Plane(origin=(7.85, -4.4, -9.598557292), x_dir=(0, 0, 1), z_dir=(-1, 0, 0)) * Cylinder(1.3, 46, mode=Mode.PRIVATE)
    fillet_3_piece_2 = split(fillet_3_piece_2, bisect_by=Plane(origin=(7.85, 0.6, -9), z_dir=(0, -1, 0)), keep=Keep.TOP, mode=Mode.PRIVATE)
    add(fillet_3_piece_2)

    # 草图16 → 切除-拉伸9 (cut)
    with BuildSketch(Plane(origin=(22.65, 0, 0), x_dir=(0, 0, -1), z_dir=(1, 0, 0)).offset(CUT_EXTRUDE_START)):
        with BuildLine():
            Line((9, -5.554005705), (9, -3.245994295))
            ThreePointArc((9, -3.245994295), (8.298557292, -4.4), (9, -5.554005705))
        make_face()
    extrude(amount=CUT_EXTRUDE_9_DEPTH, mode=Mode.SUBTRACT)

    # 草图17 → 切除-拉伸10 (cut)
    with BuildSketch(Plane.ZY.offset(-7.85)):
        with BuildLine():
            Line((-9, -3.245994295), (-9, -5.554005705))
            ThreePointArc((-9, -5.554005705), (-8.298557292, -4.4), (-9, -3.245994295))
        make_face()
    extrude(amount=-CUT_EXTRUDE_10_DEPTH, mode=Mode.SUBTRACT)

    # 圆角4
    # the kernel refuses this fillet: 1 mm, written as the material it adds along each edge
    with BuildSketch(Plane(origin=(10.85, -4.4, -9.598557292), x_dir=(0, -0.12437985627786666, -0.9922346755441966), z_dir=(0, 0.9922346755441966, -0.12437985627786666))) as fillet_4_piece_1_section:
        with BuildLine():
            CenterArc((1.3 - FILLET_4_R, FILLET_4_R), FILLET_4_R, 270, 90)
            Line((1.3 - FILLET_4_R, 0), (1.3, 0))
            Line((1.3, 0), (1.3, FILLET_4_R))
        make_face()
    fillet_4_piece_1 = revolve(axis=Axis((10.85, -4.4, -9.598557292), (-1, 0, 0)), revolution_arc=345.710110631, mode=Mode.PRIVATE)
    fillet_4_piece_1 = split(fillet_4_piece_1, bisect_by=Plane(origin=(10.85, -4.4, -9), z_dir=(0, 0, 1)), keep=Keep.TOP, mode=Mode.PRIVATE)
    add(fillet_4_piece_1)
    with BuildSketch(Plane(origin=(19.65, -4.4, -9.598557292), x_dir=(0, 0.12437985627786262, -0.9922346755441972), z_dir=(0, -0.9922346755441972, -0.12437985627786262))) as fillet_4_piece_2_section:
        with BuildLine():
            CenterArc((1.3 - FILLET_4_R, FILLET_4_R), FILLET_4_R, 270, 90)
            Line((1.3, FILLET_4_R), (1.3, 0))
            Line((1.3, 0), (1.3 - FILLET_4_R, 0))
        make_face()
    fillet_4_piece_2 = revolve(axis=Axis((19.65, -4.4, -9.598557292), (1, 0, 0)), revolution_arc=345.710110631, mode=Mode.PRIVATE)
    fillet_4_piece_2 = split(fillet_4_piece_2, bisect_by=Plane(origin=(19.65, -4.4, -9), z_dir=(0, 0, 1)), keep=Keep.TOP, mode=Mode.PRIVATE)
    add(fillet_4_piece_2)


solid = part.part
